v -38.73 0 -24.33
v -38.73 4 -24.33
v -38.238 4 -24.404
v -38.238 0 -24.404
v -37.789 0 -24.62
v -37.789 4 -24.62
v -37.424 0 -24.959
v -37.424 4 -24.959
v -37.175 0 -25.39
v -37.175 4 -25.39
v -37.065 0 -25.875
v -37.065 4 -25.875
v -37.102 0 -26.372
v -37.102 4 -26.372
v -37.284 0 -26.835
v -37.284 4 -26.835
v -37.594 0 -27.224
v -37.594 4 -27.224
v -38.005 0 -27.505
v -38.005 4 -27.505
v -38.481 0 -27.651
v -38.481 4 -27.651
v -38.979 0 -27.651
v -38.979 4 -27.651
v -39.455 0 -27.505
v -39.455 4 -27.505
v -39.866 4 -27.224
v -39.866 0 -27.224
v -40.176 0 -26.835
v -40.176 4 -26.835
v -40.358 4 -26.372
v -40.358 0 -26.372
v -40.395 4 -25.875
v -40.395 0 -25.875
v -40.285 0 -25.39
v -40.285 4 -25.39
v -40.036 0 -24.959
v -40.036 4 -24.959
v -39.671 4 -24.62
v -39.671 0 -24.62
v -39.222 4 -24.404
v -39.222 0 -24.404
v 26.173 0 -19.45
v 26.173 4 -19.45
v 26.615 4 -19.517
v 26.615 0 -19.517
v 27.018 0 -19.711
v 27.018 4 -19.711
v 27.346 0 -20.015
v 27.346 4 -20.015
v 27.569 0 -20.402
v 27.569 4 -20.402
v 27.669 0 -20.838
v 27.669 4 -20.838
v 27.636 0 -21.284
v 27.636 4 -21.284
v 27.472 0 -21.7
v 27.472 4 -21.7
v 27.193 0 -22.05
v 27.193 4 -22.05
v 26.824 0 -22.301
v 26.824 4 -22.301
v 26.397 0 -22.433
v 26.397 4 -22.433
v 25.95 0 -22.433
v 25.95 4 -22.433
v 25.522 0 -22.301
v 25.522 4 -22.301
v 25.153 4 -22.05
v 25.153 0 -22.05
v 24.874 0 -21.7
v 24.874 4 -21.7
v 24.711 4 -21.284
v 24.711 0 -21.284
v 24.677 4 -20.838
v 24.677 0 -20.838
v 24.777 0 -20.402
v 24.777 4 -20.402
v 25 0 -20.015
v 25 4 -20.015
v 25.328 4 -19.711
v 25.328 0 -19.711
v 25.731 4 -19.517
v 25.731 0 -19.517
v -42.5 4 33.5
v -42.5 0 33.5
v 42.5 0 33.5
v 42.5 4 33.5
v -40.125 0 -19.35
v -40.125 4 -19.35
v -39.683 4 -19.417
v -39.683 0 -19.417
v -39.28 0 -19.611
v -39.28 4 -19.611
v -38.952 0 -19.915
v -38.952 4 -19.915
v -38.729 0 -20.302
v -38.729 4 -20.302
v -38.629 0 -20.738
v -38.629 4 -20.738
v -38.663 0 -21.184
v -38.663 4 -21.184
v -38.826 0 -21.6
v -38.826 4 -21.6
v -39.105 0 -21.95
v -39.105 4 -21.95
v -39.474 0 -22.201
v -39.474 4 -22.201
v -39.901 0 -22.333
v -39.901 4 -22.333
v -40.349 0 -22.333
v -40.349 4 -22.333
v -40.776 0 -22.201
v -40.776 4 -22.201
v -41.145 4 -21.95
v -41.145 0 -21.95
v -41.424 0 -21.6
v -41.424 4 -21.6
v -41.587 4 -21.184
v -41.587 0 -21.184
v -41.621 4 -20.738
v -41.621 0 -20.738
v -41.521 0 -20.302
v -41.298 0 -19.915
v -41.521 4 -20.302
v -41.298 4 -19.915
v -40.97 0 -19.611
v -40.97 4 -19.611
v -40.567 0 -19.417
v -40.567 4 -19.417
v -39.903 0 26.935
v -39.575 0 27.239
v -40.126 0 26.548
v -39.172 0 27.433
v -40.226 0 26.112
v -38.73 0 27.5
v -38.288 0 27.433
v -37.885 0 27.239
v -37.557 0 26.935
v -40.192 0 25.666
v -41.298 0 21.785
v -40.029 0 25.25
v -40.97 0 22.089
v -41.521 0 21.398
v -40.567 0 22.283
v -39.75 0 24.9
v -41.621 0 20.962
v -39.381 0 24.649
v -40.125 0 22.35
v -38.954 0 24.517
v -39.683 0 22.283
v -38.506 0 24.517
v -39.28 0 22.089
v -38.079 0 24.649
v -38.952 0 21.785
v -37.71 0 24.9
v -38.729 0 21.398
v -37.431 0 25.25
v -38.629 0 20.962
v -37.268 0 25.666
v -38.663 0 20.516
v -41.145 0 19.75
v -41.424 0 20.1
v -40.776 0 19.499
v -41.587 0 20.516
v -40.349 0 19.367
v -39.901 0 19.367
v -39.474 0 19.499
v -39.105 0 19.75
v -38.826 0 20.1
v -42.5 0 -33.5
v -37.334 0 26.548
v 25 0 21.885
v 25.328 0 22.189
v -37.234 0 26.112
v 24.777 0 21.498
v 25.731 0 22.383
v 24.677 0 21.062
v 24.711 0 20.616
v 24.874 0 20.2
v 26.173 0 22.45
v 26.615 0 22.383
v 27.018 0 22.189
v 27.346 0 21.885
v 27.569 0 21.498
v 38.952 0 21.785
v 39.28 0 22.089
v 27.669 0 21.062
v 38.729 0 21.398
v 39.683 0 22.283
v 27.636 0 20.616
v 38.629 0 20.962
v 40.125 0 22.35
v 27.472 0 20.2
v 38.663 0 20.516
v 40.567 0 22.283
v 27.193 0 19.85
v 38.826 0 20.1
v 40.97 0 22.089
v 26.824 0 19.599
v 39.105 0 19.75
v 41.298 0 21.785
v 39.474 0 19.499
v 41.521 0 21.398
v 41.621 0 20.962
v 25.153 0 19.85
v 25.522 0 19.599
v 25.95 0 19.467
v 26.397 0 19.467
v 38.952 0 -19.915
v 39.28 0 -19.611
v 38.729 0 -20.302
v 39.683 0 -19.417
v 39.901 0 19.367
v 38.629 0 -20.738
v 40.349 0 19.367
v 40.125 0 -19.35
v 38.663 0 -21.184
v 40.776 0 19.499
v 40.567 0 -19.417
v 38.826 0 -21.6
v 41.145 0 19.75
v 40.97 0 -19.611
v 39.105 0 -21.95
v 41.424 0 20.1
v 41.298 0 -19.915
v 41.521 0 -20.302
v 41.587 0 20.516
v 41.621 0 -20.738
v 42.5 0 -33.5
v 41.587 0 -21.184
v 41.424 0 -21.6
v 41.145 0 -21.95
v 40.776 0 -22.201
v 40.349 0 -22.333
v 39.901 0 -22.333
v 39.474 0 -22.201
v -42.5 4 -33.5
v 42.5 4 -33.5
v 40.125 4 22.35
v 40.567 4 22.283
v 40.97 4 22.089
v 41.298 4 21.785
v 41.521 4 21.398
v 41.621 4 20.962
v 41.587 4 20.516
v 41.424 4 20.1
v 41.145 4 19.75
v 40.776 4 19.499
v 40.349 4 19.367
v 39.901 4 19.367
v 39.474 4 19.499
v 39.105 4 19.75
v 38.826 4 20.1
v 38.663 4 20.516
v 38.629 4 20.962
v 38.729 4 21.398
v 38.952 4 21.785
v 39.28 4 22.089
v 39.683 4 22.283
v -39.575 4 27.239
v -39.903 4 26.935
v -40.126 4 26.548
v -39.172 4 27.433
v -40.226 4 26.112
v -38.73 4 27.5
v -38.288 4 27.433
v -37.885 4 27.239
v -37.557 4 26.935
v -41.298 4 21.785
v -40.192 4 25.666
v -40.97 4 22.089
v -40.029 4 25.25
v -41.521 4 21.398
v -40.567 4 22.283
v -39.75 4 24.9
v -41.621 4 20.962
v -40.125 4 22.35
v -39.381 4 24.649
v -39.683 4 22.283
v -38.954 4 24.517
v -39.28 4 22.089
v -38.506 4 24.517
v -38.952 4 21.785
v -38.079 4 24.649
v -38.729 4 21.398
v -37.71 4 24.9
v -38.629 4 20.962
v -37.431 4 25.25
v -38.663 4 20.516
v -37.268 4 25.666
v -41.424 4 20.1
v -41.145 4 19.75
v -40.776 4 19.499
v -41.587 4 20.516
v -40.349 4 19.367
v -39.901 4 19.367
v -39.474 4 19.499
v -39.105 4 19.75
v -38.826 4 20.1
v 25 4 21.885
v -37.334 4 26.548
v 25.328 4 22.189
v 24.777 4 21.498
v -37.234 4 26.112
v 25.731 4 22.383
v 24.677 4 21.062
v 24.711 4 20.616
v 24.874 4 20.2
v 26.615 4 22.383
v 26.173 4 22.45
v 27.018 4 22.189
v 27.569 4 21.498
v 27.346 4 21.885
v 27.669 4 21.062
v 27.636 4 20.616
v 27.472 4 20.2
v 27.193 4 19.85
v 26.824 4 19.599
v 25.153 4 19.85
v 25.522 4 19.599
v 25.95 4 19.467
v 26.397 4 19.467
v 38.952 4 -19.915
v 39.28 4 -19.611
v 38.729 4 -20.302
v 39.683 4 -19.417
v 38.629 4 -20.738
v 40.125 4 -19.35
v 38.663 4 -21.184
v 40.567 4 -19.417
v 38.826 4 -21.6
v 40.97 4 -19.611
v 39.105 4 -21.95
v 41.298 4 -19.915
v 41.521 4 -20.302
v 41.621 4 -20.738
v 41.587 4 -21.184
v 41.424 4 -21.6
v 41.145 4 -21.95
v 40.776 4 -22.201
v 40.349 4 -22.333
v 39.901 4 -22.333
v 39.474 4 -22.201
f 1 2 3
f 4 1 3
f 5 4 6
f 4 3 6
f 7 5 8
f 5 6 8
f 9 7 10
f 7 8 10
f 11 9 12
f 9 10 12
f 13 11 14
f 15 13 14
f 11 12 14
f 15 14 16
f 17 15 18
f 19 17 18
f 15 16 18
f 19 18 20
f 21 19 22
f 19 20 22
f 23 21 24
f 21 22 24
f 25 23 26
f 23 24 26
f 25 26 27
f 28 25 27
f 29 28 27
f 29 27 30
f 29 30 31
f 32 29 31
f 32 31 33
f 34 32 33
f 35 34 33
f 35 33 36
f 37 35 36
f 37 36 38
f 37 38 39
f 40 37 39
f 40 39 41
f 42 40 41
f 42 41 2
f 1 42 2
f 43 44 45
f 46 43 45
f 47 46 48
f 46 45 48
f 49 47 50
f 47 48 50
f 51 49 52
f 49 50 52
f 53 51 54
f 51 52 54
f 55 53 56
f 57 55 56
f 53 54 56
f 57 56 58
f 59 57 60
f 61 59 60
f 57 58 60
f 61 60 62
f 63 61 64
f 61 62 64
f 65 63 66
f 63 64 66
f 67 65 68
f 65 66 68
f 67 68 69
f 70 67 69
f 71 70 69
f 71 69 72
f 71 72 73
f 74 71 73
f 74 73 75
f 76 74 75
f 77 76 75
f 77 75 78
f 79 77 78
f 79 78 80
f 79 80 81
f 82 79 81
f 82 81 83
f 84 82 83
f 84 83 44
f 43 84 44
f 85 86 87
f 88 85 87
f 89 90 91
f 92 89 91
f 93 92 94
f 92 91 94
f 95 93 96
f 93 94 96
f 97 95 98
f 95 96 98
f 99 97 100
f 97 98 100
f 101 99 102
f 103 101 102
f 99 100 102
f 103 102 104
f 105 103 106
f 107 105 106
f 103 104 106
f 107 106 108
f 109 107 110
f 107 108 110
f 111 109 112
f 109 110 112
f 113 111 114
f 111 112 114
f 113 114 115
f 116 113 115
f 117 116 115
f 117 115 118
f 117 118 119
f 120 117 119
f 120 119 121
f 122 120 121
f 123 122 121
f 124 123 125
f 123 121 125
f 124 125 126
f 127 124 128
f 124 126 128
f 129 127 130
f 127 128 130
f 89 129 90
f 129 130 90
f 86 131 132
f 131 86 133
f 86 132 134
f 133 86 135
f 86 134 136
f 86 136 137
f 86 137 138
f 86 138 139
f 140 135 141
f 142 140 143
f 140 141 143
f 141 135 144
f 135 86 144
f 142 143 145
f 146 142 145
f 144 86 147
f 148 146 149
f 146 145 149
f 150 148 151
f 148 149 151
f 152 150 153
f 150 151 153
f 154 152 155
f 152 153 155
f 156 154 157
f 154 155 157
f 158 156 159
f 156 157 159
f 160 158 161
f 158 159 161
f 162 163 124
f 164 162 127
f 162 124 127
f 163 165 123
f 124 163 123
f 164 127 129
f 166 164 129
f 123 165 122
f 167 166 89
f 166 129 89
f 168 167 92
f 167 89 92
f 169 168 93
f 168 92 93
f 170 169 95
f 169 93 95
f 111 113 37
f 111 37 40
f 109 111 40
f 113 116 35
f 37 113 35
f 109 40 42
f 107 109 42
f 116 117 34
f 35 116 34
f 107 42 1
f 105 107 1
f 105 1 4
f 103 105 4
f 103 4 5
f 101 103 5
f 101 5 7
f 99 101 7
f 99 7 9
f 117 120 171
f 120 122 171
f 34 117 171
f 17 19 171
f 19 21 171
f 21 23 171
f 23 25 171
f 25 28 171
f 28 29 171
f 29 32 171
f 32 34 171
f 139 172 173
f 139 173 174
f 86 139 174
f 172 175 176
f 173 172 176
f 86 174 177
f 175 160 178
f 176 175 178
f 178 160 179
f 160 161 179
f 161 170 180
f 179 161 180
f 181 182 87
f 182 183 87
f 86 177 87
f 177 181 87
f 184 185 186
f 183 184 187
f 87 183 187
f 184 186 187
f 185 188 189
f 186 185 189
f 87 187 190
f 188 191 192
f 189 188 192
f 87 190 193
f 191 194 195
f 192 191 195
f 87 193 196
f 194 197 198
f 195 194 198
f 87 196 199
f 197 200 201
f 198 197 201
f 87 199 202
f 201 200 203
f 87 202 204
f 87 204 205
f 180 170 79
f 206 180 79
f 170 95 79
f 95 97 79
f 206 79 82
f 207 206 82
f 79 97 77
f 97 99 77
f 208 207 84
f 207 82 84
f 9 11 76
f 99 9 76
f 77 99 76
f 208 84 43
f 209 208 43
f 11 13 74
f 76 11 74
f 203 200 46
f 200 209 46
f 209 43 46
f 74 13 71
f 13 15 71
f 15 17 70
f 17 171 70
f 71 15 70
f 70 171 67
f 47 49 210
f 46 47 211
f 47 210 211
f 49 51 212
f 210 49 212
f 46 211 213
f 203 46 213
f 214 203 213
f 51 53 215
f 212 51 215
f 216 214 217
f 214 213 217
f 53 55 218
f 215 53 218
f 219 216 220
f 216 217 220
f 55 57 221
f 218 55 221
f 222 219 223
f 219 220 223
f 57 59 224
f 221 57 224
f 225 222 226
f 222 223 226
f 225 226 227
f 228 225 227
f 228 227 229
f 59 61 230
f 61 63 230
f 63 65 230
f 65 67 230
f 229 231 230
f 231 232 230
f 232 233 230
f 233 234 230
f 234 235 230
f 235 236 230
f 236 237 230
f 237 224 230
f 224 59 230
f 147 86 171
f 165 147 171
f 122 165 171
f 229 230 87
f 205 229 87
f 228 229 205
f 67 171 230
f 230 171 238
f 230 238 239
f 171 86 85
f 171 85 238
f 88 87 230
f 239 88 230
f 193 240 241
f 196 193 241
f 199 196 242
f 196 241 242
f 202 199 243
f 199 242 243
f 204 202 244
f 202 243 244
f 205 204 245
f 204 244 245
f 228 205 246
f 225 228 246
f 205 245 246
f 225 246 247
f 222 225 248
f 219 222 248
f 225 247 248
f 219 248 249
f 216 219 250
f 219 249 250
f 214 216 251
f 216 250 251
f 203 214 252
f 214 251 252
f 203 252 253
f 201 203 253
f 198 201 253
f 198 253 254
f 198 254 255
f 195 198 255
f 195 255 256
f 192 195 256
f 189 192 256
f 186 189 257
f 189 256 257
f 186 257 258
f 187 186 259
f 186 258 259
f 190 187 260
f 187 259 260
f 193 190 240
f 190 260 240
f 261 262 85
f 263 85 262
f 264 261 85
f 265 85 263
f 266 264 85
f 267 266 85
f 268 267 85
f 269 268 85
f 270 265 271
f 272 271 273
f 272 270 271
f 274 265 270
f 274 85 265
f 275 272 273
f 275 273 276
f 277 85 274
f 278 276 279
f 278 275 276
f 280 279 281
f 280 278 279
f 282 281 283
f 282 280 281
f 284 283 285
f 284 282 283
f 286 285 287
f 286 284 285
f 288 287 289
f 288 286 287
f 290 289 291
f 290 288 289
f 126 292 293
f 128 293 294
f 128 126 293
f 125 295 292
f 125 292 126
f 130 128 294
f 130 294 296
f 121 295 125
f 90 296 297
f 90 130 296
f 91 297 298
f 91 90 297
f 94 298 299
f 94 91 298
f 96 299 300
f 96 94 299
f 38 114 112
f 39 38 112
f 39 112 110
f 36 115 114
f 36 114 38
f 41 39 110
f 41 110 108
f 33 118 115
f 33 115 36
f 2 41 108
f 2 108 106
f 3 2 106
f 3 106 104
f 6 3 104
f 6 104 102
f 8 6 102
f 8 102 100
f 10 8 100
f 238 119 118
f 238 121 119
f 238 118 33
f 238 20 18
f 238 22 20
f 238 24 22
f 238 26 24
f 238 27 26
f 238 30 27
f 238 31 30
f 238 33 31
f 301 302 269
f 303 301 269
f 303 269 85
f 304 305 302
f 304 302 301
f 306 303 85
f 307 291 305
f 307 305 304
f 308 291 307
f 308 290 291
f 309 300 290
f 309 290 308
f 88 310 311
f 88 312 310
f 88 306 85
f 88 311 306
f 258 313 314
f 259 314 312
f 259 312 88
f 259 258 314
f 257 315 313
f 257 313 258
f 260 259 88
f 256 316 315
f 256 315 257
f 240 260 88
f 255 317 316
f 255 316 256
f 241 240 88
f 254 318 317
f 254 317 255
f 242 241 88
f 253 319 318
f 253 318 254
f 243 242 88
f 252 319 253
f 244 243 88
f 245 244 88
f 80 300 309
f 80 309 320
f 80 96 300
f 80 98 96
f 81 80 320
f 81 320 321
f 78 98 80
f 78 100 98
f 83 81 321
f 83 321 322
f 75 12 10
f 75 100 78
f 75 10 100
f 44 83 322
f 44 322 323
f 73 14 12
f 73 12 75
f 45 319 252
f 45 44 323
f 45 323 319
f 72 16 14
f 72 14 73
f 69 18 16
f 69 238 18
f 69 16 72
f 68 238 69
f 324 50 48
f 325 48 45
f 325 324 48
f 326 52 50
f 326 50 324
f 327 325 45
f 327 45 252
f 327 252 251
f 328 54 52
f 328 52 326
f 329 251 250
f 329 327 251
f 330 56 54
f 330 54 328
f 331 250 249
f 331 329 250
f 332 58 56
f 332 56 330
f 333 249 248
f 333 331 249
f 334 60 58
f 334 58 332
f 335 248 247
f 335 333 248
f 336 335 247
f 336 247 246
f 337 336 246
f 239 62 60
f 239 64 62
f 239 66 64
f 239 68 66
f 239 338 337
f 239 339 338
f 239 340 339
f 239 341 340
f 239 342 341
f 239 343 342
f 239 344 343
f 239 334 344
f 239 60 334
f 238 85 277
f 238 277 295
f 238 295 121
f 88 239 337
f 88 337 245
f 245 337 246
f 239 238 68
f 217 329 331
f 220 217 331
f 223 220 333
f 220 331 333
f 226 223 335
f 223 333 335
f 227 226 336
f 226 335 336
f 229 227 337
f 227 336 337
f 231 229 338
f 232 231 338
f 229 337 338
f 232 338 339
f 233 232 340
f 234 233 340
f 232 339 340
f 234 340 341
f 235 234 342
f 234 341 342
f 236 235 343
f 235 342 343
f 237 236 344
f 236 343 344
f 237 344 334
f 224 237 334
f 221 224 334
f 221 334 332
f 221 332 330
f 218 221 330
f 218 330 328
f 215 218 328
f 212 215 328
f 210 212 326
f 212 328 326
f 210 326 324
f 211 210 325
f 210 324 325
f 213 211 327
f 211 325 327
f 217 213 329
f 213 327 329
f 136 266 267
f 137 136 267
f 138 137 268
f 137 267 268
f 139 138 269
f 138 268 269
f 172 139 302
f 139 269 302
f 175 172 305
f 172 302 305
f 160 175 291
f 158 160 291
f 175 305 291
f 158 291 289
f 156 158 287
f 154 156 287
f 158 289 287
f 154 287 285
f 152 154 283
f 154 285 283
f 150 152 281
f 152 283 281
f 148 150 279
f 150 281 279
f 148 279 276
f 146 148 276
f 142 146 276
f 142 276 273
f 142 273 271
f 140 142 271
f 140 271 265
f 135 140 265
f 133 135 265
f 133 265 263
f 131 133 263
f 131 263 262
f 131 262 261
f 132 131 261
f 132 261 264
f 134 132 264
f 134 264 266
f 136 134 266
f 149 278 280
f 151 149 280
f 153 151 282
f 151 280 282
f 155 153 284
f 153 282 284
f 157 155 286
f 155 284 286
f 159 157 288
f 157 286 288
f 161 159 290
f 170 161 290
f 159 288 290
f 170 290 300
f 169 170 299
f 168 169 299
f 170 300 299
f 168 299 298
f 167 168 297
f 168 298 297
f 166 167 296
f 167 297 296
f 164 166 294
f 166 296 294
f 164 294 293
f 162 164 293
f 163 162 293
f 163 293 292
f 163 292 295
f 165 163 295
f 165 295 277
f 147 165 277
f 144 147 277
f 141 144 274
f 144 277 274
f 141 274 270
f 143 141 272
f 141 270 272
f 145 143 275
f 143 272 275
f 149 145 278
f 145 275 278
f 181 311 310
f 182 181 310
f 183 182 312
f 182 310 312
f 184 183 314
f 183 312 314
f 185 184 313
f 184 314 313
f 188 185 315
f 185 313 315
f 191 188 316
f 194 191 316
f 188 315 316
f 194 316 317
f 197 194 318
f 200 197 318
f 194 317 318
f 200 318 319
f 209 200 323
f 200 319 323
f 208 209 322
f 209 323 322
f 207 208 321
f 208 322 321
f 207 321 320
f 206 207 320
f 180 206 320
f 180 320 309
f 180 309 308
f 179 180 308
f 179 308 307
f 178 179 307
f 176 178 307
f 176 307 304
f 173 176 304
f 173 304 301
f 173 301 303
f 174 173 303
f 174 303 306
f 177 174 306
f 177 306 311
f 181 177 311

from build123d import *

# Parameters (mm, degrees)
SKETCH1_W           = 85
SKETCH1_H           = 67
BOSS_EXTRUDE1_DEPTH = 4
SKETCH2_R           = 1.5
CUT_EXTRUDE1_DEPTH  = 4
SKETCH3_R           = 1.5
SKETCH3_R_2         = 1.67
CUT_EXTRUDE2_DEPTH  = 10


with BuildPart() as part:
    # Sketch1 → Boss-Extrude1 (new body)
    with BuildSketch(Plane(origin=(0, 0, 0), x_dir=(1, 0, 0), z_dir=(0, 1, 0))):
        Rectangle(SKETCH1_W, SKETCH1_H)
    extrude(amount=BOSS_EXTRUDE1_DEPTH)

    # Sketch2 → Cut-Extrude1 (cut)
    with BuildSketch(Plane(origin=(0, 4, 0), x_dir=(1, 0, 0), z_dir=(0, 1, 0))):
        with Locations(Location((-40.125, 20.85, 0), (0, 0, 270))):
            Circle(SKETCH2_R)
        with Locations(Location((-40.125, -20.85, 0), (0, 0, 270))):
            Circle(SKETCH2_R)
        with Locations(Location((40.125, 20.85, 0), (0, 0, 270))):
            Circle(SKETCH2_R)
        with Locations(Location((40.125, -20.85, 0), (0, 0, 270))):
            Circle(SKETCH2_R)
    extrude(amount=-CUT_EXTRUDE1_DEPTH, mode=Mode.SUBTRACT)

    # Sketch3 → Cut-Extrude2 (cut)
    with BuildSketch(Plane(origin=(0, 4, 0), x_dir=(1, 0, 0), z_dir=(0, 1, 0))):
        with Locations(Location((26.173152267, 20.95, 0), (0, 0, 270))):
            Circle(SKETCH3_R)
        with Locations(Location((26.173152267, -20.95, 0), (0, 0, 270))):
            Circle(SKETCH3_R)
        with Locations(Location((-38.73, 26, 0), (0, 0, 270))):
            Circle(SKETCH3_R_2)
        with Locations(Location((-38.73, -26, 0), (0, 0, 270))):
            Circle(SKETCH3_R)
    extrude(amount=-CUT_EXTRUDE2_DEPTH, mode=Mode.SUBTRACT)


solid = part.part
